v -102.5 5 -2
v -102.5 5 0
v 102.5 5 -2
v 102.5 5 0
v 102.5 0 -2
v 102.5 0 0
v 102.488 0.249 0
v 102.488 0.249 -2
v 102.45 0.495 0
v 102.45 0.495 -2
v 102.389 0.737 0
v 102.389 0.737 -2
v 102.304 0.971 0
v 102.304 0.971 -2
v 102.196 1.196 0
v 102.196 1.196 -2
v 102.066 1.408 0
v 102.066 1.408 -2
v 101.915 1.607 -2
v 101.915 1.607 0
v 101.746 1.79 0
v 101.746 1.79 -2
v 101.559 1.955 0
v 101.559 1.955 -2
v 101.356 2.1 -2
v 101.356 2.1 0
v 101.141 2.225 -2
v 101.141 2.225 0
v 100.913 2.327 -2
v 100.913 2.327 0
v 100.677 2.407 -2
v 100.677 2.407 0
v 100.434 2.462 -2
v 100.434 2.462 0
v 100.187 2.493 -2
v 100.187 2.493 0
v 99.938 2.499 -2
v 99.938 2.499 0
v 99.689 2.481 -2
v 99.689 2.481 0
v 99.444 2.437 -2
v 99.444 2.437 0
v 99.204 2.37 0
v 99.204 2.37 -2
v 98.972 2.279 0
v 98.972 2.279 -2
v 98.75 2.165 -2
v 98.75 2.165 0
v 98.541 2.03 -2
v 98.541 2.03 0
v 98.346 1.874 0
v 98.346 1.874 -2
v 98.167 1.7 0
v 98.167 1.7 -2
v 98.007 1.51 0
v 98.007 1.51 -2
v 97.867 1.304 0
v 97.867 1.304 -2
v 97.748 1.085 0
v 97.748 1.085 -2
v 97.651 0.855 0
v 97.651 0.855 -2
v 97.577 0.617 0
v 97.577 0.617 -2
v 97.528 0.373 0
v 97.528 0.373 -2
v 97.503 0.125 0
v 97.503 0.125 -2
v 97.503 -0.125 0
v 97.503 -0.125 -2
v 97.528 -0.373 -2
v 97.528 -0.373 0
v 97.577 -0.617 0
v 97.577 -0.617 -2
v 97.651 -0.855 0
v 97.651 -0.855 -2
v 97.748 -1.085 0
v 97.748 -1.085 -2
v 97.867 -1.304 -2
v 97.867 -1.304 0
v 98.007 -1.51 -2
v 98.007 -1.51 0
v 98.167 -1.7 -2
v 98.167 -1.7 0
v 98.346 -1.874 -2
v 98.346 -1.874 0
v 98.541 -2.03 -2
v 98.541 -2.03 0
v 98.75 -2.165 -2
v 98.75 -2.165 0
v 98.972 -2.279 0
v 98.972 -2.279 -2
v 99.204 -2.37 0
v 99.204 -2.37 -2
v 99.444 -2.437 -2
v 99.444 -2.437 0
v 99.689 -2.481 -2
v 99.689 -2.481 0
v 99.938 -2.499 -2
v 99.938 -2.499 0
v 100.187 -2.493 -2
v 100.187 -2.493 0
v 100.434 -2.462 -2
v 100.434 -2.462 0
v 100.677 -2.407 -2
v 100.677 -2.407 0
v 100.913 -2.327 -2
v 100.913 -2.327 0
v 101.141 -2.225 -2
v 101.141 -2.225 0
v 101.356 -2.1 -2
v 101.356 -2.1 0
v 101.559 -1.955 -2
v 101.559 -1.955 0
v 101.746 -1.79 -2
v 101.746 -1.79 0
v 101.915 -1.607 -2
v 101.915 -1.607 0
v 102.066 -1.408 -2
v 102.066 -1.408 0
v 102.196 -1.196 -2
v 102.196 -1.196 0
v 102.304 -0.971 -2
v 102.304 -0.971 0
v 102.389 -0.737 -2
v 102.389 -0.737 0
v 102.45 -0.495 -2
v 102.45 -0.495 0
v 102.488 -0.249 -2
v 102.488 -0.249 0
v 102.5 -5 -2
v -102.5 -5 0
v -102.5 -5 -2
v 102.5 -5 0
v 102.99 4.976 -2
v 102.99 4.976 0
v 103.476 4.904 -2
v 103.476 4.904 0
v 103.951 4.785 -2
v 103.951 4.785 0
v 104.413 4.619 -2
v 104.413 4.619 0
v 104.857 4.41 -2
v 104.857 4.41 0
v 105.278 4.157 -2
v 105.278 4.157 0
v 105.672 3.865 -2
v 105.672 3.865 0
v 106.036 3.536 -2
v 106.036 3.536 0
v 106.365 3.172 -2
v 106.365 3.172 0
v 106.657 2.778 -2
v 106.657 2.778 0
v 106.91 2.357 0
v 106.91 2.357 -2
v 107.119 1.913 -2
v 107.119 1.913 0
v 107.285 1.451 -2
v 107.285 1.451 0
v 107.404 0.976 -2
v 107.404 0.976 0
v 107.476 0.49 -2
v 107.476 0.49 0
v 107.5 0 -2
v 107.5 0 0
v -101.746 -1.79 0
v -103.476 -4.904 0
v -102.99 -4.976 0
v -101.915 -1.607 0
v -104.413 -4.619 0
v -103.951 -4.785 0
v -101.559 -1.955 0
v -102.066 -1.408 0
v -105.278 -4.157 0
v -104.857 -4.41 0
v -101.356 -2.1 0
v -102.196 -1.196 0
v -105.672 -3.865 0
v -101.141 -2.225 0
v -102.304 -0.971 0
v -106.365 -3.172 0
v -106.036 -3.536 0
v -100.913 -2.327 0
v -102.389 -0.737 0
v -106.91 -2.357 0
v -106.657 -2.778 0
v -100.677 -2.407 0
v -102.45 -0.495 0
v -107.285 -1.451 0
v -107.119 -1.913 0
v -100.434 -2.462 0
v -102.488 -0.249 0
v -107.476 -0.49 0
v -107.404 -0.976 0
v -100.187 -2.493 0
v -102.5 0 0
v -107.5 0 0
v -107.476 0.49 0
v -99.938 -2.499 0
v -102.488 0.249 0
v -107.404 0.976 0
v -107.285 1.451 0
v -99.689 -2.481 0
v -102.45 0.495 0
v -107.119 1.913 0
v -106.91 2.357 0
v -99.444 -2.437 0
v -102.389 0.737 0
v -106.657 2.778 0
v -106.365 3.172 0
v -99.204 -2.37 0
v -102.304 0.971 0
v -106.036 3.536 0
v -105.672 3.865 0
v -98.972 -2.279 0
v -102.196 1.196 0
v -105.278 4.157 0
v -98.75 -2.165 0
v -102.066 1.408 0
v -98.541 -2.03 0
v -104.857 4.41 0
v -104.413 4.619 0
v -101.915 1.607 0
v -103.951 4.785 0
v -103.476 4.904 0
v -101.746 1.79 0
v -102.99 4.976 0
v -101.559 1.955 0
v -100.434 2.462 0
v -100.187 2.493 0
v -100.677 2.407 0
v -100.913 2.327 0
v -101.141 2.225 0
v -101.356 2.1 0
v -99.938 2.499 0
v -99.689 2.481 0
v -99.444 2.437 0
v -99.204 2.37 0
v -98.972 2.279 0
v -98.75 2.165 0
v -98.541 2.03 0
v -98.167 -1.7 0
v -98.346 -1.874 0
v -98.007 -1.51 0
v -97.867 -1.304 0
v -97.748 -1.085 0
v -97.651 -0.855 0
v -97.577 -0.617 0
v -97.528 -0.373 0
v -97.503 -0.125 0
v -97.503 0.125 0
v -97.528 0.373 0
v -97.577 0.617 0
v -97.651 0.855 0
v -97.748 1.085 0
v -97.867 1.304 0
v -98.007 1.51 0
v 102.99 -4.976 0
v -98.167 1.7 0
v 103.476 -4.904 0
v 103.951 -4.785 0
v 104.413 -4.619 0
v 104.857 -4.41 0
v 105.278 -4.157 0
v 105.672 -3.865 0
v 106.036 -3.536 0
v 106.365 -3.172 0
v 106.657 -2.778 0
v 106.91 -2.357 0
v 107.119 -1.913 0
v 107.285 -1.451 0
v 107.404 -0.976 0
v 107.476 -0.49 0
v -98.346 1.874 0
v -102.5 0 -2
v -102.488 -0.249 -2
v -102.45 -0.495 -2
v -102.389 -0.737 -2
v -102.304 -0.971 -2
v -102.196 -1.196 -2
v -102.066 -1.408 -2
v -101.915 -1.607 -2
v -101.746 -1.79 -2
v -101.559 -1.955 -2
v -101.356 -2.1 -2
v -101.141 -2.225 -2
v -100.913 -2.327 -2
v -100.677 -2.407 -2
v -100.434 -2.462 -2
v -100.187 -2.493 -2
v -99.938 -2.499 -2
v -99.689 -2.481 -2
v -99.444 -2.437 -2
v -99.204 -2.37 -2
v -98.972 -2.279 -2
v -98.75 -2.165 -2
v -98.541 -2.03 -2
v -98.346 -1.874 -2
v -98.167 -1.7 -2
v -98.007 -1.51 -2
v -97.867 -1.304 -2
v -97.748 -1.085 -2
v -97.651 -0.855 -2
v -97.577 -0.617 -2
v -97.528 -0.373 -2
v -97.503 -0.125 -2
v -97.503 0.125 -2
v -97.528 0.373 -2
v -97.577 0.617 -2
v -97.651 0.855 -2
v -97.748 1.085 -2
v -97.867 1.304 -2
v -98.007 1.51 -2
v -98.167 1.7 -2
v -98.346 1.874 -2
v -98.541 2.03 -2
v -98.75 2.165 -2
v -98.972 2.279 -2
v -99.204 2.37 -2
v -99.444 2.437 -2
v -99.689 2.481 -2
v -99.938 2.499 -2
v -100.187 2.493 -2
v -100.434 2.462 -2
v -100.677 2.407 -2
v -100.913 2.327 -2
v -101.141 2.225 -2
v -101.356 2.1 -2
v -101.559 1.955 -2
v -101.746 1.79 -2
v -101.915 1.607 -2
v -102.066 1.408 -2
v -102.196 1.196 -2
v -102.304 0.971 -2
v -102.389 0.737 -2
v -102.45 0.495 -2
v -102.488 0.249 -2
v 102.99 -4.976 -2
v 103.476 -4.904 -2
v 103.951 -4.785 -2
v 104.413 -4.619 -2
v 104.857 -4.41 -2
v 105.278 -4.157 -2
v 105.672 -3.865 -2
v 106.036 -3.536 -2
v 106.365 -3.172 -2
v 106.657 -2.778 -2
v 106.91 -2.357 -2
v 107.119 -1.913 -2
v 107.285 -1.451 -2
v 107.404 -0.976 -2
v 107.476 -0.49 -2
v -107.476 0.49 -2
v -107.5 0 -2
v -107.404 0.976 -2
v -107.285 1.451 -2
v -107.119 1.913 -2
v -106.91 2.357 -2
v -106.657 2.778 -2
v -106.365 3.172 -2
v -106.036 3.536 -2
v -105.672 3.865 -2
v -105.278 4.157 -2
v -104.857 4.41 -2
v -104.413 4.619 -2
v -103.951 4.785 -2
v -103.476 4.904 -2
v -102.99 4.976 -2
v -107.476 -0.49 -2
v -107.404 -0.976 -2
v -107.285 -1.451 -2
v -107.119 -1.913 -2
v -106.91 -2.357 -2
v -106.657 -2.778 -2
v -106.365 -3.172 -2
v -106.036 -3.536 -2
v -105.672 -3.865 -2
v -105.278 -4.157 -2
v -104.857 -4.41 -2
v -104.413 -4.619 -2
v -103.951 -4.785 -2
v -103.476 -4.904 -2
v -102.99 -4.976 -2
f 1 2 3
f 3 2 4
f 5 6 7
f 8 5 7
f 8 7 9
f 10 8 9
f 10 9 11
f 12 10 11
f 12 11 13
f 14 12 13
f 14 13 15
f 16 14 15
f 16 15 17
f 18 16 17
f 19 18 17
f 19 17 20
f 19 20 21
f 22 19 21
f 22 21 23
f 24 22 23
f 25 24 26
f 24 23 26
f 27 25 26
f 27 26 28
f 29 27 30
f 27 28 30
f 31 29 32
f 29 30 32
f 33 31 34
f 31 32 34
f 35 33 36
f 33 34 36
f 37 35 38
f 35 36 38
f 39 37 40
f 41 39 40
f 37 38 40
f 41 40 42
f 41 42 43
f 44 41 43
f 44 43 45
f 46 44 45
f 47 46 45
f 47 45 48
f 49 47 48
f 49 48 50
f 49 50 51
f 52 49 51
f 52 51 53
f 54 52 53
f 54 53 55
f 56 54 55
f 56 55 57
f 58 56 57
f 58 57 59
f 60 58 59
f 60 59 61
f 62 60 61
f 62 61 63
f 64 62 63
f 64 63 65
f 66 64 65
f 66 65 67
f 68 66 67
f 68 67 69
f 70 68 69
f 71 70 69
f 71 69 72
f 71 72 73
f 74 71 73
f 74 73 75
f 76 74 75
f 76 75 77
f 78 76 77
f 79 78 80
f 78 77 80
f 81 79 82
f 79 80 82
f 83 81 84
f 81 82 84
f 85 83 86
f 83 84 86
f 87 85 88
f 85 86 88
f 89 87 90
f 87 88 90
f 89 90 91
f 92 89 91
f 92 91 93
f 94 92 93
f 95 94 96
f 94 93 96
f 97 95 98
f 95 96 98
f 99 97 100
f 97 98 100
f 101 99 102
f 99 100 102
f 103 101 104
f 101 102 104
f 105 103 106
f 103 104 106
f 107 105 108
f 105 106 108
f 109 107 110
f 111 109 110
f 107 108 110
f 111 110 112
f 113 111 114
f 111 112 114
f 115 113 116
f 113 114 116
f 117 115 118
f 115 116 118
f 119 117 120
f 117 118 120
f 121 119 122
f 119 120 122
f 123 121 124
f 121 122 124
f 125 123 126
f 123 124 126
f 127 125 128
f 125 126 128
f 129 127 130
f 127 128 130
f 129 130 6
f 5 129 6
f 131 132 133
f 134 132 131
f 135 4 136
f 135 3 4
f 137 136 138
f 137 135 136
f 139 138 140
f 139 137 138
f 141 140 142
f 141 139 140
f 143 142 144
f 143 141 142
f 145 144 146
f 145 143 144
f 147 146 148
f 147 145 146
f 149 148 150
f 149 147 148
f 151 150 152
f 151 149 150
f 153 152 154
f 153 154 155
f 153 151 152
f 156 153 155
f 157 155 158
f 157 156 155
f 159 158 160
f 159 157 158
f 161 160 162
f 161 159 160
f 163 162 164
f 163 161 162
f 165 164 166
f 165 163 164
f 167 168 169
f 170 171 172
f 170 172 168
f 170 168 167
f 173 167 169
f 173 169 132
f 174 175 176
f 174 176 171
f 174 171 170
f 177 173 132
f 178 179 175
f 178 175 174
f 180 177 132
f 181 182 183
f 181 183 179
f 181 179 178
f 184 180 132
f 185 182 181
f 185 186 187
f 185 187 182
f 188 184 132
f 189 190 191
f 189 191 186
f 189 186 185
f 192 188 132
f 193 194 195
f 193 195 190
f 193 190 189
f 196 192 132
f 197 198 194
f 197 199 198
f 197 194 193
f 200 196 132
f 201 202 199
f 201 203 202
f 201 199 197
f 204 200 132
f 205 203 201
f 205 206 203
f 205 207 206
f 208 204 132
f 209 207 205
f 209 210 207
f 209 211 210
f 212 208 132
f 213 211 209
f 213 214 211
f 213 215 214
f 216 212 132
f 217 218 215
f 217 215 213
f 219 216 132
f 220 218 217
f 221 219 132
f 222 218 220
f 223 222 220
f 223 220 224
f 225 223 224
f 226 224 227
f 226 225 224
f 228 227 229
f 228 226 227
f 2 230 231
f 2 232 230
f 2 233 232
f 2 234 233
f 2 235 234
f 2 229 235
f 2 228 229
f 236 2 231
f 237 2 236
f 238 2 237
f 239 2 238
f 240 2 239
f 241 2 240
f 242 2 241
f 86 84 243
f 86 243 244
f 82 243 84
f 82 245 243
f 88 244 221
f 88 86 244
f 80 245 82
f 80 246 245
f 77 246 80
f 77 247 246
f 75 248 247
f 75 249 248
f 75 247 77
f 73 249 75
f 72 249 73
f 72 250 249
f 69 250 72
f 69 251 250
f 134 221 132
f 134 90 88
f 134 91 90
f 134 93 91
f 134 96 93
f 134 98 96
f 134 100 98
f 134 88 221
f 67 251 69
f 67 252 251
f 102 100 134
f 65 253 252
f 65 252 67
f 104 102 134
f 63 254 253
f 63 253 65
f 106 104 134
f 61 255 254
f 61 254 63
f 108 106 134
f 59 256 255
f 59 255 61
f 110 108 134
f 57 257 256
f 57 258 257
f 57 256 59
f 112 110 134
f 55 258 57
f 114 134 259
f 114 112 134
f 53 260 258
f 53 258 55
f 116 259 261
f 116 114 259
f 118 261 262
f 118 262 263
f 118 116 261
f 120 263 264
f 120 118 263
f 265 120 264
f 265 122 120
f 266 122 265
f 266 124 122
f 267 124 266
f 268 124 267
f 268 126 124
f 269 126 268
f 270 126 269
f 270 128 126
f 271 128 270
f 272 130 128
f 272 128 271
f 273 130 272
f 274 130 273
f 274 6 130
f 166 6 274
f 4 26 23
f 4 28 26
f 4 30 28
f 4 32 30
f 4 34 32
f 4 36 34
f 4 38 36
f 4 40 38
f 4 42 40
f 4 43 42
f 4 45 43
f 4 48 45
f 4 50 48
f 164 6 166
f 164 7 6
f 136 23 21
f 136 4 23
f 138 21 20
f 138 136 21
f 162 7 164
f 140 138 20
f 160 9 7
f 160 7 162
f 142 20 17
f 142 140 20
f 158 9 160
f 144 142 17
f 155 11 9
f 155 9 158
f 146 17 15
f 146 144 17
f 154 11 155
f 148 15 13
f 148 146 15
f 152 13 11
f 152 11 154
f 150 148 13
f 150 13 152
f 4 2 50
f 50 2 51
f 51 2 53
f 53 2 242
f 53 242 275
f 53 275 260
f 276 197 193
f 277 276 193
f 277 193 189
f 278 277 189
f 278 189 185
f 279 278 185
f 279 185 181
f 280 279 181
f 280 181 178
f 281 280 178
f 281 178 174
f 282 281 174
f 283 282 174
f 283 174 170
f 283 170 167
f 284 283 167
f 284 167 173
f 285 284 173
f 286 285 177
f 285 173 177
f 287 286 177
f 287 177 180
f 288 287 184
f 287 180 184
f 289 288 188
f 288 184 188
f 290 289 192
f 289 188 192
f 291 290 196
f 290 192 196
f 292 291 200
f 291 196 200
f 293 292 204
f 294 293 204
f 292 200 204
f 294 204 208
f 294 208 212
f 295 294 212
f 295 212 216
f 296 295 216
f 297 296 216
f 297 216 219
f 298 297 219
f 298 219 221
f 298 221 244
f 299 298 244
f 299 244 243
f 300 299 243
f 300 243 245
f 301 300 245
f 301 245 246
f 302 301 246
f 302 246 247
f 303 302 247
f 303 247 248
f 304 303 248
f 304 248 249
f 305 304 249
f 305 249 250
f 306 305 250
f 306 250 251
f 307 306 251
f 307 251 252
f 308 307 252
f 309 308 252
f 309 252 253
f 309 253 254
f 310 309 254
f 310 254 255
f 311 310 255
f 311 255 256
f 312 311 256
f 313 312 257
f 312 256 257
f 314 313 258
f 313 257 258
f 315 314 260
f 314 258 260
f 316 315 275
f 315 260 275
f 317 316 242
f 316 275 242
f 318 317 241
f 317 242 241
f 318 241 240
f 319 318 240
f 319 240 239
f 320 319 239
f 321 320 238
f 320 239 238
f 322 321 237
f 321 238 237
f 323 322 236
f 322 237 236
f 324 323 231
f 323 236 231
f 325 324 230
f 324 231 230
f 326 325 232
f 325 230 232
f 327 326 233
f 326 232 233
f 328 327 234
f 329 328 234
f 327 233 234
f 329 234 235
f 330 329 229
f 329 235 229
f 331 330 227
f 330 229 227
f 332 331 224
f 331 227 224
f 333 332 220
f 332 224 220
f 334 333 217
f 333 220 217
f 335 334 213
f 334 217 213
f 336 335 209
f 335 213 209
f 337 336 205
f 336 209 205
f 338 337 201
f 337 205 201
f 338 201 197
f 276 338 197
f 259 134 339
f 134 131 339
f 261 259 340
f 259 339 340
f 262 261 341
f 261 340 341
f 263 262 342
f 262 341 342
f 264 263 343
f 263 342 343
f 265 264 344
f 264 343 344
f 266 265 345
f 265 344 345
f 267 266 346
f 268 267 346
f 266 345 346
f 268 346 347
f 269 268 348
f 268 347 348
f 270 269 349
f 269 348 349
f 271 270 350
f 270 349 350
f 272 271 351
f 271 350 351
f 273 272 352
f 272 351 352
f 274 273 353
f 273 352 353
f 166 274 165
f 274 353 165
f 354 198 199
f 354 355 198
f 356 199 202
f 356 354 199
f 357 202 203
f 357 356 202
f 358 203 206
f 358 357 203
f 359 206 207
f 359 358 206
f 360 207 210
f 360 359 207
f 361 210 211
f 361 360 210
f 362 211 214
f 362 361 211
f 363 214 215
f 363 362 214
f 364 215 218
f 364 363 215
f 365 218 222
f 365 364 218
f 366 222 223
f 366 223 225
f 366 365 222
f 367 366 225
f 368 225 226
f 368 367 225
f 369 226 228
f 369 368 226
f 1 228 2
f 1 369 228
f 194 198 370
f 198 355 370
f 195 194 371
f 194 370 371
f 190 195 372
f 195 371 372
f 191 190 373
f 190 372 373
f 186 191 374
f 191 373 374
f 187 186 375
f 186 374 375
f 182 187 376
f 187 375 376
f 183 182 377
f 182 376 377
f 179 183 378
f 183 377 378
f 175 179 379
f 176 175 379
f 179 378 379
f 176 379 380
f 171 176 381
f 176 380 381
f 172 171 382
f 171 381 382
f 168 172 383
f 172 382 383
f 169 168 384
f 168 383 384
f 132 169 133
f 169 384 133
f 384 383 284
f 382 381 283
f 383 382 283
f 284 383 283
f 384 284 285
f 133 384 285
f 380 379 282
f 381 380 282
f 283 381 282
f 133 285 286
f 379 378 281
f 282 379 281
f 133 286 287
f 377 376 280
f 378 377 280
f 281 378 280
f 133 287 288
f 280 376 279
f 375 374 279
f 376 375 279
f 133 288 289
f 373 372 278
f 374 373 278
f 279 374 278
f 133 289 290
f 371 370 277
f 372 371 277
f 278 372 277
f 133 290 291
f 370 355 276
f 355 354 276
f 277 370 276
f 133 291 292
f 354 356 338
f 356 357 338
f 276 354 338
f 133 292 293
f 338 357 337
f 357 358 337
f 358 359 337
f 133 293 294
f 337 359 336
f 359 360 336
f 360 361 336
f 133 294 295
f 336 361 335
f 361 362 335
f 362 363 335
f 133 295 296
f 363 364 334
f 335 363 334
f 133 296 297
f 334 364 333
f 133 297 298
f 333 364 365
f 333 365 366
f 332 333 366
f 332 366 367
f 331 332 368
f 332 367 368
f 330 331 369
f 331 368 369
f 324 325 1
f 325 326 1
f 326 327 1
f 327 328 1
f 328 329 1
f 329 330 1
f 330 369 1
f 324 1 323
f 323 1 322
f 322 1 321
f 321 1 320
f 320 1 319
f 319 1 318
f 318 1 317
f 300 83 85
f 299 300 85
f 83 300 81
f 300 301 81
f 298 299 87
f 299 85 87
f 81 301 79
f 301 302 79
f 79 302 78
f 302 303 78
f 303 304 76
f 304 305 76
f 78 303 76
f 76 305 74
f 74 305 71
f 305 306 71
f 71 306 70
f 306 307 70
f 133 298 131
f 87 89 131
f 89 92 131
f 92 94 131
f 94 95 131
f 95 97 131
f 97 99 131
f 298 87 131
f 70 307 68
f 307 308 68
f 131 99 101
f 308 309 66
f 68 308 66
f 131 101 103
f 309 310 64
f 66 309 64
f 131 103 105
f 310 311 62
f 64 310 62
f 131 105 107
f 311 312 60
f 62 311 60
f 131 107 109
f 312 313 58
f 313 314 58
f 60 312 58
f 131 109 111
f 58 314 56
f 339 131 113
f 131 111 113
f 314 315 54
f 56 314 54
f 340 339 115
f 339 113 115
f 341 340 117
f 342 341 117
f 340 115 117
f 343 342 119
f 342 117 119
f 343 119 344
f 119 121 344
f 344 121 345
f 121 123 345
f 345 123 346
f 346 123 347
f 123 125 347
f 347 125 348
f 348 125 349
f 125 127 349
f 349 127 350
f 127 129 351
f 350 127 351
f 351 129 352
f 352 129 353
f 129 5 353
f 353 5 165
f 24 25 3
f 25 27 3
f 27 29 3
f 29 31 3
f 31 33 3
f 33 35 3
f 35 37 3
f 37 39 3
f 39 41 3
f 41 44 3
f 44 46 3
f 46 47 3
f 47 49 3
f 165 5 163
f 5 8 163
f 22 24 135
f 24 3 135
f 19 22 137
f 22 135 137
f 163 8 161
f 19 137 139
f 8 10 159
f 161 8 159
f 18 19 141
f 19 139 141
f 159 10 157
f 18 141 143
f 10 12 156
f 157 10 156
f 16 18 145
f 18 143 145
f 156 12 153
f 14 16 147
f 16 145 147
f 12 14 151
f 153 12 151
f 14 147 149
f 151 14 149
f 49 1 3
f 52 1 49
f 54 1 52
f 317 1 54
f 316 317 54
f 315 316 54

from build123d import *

# Parameters (mm, degrees)
SKETCH_1_W             = 215
SKETCH_1_H             = 10
SM_BASE_FLANGE_1_DEPTH = 2
SKETCH_6_R             = 2.5
CUT_EXTRUDE_1_DEPTH    = 108.634799205
FILLET_1_R             = 5


# Sheet-metal steps are written as plain solids
with BuildPart() as part:
    # Sketch 1 → Базовая кромка1 (new body)
    with BuildSketch(Plane.XY):
        Rectangle(SKETCH_1_W, SKETCH_1_H)
    extrude(amount=-SM_BASE_FLANGE_1_DEPTH)

    # Эскиз6 → Вырез-Вытянуть1 (cut, through all)
    with BuildSketch(Plane.XY):
        with Locations((100, 0)):
            Circle(SKETCH_6_R)
        with Locations(Location((-100, 0, 0), (0, 0, 180))):
            Circle(SKETCH_6_R)
    extrude(amount=-CUT_EXTRUDE_1_DEPTH, mode=Mode.SUBTRACT)

    # Скругление1
    fillet_1_edges = [part.edges().sort_by_distance(p)[0] for p in [
        (107.5, -5, -1),
        (107.5, 5, -1),
        (-107.5, -5, -1),
        (-107.5, 5, -1),
    ]]
    fillet(fillet_1_edges, radius=FILLET_1_R - 0.0001)  # a hair under: the kernel refuses the full size


solid = part.part
